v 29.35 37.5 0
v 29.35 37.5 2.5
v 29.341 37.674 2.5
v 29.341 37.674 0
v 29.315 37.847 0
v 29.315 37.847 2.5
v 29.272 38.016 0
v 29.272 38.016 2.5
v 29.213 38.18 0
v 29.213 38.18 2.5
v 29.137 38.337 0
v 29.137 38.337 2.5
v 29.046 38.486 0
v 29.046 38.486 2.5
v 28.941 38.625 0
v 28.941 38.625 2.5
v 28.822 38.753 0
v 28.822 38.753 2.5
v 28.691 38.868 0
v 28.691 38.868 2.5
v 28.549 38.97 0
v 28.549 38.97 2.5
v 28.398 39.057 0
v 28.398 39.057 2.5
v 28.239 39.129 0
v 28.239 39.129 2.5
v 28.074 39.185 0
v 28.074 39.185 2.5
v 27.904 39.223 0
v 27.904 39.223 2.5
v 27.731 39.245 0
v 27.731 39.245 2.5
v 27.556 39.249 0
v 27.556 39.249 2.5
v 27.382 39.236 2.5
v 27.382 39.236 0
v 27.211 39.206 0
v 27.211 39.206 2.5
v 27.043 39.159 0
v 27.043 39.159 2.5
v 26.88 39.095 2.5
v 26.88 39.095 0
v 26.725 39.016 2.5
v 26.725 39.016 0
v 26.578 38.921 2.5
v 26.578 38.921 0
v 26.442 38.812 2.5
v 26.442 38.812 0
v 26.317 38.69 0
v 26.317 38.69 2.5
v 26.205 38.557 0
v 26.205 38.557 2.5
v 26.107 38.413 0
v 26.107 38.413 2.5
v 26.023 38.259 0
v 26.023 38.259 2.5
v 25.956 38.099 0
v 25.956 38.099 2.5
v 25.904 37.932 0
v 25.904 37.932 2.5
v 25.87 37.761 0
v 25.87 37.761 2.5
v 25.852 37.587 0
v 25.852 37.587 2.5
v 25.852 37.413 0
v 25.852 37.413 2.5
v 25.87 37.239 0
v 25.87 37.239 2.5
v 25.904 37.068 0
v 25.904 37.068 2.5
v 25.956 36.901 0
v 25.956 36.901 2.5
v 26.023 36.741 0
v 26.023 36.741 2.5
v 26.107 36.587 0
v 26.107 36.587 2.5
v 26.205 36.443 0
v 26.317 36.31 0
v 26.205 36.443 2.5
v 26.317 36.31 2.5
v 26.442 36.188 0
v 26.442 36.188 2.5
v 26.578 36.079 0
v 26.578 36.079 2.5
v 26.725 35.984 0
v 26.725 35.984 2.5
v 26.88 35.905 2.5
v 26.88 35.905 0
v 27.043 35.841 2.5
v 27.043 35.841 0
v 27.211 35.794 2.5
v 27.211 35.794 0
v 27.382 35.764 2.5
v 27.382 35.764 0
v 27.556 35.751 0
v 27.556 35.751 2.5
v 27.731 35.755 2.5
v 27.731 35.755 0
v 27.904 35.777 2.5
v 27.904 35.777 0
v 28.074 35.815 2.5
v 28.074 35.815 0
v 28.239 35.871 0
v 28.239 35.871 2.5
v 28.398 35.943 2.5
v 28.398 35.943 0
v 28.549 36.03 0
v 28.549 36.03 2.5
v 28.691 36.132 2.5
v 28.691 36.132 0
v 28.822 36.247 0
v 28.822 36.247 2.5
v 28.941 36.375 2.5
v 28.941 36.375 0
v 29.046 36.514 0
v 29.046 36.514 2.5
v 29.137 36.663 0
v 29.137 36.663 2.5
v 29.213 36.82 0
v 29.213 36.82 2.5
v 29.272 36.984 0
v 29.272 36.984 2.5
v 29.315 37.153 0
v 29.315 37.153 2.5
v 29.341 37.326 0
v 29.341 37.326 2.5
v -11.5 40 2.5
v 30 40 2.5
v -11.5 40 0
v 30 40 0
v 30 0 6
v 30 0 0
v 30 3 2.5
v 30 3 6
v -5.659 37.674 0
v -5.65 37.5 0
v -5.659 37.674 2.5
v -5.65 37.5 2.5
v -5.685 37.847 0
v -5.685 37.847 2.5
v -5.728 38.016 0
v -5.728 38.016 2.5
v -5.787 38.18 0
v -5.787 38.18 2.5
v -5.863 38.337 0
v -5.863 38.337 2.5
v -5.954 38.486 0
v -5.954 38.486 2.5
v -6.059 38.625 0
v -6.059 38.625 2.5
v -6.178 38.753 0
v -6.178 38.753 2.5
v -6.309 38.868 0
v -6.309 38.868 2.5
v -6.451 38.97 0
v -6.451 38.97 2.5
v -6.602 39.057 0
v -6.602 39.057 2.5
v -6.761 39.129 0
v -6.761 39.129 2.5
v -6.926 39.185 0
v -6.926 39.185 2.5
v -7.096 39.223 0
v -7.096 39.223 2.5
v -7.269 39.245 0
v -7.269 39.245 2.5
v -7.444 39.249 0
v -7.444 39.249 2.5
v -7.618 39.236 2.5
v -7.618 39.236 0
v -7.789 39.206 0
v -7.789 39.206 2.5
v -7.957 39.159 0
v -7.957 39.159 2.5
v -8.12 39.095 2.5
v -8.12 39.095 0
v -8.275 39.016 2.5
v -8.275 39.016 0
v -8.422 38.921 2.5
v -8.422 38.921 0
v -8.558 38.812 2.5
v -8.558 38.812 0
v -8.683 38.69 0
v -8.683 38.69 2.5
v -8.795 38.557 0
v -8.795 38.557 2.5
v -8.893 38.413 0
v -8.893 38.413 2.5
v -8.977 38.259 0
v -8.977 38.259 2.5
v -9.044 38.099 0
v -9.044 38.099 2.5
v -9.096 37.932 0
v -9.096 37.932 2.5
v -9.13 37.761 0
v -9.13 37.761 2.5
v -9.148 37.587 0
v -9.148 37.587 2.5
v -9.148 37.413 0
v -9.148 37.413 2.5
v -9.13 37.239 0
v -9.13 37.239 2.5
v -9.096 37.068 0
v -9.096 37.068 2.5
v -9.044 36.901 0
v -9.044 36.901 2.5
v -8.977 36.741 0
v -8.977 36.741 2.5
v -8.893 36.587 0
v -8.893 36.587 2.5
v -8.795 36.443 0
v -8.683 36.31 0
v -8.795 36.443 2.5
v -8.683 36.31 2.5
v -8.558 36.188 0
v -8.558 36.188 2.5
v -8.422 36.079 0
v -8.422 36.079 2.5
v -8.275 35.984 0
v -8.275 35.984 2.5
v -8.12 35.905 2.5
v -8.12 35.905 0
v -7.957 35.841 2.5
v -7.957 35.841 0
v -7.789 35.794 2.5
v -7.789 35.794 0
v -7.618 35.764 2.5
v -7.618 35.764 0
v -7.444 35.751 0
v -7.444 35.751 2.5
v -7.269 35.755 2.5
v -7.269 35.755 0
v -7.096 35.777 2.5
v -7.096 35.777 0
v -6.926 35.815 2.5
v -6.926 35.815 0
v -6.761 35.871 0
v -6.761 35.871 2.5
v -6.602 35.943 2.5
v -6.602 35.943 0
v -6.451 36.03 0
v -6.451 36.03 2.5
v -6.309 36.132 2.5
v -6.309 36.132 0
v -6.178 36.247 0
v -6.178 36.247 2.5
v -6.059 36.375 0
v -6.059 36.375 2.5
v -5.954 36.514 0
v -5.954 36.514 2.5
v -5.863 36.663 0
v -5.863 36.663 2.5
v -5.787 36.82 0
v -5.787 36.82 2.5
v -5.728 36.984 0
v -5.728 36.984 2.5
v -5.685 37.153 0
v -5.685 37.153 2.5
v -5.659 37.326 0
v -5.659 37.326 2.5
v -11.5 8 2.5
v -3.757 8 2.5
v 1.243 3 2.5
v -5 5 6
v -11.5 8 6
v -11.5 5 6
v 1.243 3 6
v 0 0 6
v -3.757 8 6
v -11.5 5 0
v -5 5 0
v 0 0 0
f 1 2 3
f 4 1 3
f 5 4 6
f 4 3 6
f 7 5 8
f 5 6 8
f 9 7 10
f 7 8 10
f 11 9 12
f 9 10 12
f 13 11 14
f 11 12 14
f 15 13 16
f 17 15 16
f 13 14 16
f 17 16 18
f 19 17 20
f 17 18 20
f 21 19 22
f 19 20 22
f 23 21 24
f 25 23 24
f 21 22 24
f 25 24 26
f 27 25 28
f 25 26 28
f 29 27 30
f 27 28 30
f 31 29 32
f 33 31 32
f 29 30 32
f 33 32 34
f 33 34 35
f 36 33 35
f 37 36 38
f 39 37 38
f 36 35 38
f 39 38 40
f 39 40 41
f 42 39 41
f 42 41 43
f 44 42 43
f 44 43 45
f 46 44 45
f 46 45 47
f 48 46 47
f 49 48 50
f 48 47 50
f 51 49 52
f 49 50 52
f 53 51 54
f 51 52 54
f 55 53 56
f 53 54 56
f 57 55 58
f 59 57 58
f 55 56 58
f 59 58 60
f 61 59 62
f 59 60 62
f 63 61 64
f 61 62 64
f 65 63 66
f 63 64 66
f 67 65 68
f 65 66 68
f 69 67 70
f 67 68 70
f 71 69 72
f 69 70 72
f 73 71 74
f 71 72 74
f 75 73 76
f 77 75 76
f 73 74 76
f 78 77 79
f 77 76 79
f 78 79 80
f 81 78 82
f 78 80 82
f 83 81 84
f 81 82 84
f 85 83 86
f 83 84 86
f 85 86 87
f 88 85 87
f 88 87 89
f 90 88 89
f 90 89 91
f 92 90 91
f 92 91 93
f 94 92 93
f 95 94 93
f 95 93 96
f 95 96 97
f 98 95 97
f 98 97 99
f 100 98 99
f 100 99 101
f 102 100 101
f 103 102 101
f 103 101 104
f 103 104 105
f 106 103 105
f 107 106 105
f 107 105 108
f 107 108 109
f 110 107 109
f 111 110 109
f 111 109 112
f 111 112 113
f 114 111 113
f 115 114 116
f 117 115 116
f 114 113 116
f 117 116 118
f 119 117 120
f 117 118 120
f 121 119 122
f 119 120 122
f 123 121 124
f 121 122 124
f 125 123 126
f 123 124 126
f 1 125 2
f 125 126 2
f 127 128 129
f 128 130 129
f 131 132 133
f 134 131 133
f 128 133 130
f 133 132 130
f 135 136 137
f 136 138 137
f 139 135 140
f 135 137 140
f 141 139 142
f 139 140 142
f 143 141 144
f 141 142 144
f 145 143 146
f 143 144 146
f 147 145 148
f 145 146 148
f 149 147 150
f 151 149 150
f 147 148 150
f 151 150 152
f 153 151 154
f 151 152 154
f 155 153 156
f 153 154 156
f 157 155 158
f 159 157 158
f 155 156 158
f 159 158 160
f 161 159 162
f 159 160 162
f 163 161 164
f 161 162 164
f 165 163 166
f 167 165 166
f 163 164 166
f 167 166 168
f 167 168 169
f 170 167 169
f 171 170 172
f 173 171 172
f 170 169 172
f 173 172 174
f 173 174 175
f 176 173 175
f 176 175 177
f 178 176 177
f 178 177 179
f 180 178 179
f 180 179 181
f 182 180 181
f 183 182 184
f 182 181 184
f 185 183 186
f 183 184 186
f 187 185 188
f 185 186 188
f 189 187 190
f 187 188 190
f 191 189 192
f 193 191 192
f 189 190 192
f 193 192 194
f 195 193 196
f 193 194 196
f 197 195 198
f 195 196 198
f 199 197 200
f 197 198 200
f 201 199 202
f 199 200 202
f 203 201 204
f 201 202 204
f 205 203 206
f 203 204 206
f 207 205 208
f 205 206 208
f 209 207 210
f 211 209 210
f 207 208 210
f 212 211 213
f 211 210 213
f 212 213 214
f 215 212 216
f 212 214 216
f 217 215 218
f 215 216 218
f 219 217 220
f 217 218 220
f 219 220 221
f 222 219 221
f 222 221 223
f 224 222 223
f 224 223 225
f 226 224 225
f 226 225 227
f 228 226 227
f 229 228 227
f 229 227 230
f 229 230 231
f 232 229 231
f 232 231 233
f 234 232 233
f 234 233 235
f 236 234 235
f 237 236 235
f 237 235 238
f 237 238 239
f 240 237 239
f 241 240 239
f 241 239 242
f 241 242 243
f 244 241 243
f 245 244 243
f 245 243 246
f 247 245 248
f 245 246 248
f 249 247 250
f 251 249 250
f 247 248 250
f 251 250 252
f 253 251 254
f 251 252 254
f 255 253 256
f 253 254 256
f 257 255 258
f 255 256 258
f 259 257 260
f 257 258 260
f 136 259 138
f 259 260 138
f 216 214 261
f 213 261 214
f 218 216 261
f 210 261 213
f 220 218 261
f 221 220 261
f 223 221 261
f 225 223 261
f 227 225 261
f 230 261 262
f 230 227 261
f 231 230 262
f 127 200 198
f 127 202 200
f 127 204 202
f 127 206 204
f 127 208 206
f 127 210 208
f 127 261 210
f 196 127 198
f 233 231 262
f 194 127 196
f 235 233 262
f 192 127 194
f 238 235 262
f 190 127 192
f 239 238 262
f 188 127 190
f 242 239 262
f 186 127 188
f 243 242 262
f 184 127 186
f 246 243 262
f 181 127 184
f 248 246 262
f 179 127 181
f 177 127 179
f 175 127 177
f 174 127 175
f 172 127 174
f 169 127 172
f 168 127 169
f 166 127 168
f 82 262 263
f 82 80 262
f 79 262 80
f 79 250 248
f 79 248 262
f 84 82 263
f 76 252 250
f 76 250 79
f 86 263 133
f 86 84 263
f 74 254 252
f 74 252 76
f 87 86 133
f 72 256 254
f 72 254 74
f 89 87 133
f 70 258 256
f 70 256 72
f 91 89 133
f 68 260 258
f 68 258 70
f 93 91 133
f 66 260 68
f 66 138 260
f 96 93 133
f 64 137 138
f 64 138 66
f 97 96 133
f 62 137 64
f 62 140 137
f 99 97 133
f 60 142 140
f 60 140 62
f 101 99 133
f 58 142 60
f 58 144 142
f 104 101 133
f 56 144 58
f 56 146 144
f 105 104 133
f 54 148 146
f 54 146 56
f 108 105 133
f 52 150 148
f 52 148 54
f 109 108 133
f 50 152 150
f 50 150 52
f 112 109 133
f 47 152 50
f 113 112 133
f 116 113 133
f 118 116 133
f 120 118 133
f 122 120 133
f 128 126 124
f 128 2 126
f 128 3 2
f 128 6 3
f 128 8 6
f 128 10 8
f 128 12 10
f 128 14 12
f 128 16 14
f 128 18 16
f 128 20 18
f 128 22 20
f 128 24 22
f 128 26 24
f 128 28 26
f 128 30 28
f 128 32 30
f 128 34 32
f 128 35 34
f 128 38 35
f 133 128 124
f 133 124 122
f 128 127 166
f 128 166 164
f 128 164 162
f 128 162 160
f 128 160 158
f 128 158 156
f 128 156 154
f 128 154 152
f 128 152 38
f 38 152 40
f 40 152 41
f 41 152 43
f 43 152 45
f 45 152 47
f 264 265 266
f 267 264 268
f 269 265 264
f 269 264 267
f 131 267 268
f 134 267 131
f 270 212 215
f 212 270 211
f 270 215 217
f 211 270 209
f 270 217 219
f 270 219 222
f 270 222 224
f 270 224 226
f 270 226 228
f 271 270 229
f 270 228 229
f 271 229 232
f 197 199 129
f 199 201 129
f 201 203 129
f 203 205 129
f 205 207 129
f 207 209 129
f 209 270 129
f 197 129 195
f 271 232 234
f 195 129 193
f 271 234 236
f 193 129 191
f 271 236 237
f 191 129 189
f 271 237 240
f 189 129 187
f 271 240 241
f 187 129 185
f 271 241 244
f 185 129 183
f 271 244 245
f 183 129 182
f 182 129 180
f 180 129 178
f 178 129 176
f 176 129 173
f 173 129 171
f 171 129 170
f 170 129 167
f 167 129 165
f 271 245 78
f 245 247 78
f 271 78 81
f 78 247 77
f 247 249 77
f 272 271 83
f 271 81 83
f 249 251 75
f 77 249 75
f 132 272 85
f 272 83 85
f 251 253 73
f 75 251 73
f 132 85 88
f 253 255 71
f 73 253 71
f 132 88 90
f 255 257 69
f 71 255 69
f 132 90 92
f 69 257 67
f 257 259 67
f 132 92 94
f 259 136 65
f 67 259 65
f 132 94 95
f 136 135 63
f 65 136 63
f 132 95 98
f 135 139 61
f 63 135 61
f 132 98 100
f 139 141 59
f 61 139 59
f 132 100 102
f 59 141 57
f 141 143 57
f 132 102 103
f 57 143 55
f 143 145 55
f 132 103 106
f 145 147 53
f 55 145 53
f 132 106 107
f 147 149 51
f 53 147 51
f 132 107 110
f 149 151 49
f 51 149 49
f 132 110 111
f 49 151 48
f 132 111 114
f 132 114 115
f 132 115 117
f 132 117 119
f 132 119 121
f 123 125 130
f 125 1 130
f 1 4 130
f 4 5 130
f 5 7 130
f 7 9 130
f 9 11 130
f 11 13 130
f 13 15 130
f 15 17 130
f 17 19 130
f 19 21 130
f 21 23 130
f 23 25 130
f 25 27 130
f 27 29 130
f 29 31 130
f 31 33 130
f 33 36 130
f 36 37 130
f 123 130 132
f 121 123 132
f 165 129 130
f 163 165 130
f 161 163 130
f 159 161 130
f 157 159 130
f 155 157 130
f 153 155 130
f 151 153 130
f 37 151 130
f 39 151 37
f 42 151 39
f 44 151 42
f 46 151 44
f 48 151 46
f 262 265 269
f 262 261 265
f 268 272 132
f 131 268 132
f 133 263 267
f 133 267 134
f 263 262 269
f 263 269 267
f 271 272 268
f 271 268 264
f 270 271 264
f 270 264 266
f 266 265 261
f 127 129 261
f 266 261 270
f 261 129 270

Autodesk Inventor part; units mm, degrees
ref_plane "YZ Plane" through (0, 0, 0) normal (1, 0, 0) x (0, 1, 0)
ref_plane "XZ Plane" through (0, 0, 0) normal (0, 1, 0) x (-1, 0, 0)
ref_plane "XY Plane" through (0, 0, 0) normal (0, 0, 1) x (1, 0, 0)
sketch "Sketch4" plane through (0, 0, 0) normal (0, 0, 1) x (1, 0, 0)
  line L0 (0, 0) -> (30, 0)
  line L1 (0, 0) -> (-5, 5)
  line L2 (-5, 5) -> (-11.5, 5)
  line L3 (30, 0) -> (30, 40)
  line L4 (30, 40) -> (-11.5, 40)
  line L5 (-11.5, 40) -> (-11.5, 5)
  dimension "d16" = 30
  dimension "d17" = 5
  dimension "d18" = 135
  dimension "d19" = 6.5
  dimension "d20" = 40
extrude "Extrusion4" add sketch "Sketch4" along normal blind 2.5
sketch "Sketch5" plane through (0, 0, 2.5) normal (0, 0, 1) x (1, 0, 0)
  line L0 (0, 0) -> (30, 0) projected
  line L1 (30, 0) -> (30, 40) projected
  line L2 (-11.5, 40) -> (-11.5, 5) projected
  line L3 (-11.5, 5) -> (-5, 5) projected
  line L4 (-5, 5) -> (0, 0) projected
  line L5 (-11.5, 8) -> (-3.7574, 8)
  line L6 (-3.7574, 8) -> (1.2426, 3)
  line L7 (1.2426, 3) -> (30, 3)
  dimension "d23" = 3
  dimension "d24" = 3
  dimension "d25" = 3
extrude "Extrusion5" add sketch "Sketch5" along normal blind 3.5
sketch "Sketch6" plane through (0, 0, 2.5) normal (0, 0, 1) x (1, 0, 0)
  line L0 (-11.5, 8) -> (-3.7574, 8) projected
  line L1 (1.2426, 3) -> (30, 3) projected
  line L2 (30, 3) -> (30, 40) projected
  line L3 (-11.5, 40) -> (-11.5, 8) projected
  circle A0 centre (-7.4, 37.5) radius 1.75
  circle A1 centre (27.6, 37.5) radius 1.75
  point P0 (0, 0)
  dimension "d28" = 29.5
  dimension "d29" = 4.1
  dimension "d30" = 3.5
  dimension "d31" = 3.5
  dimension "d32" = 2.4
  dimension "d33" = 34.5
  dimension "d36" = 6
  dimension "d37" = 6
extrude "Extrusion6" cut sketch "Sketch6" against normal up to next
properties part number "XCarriageFanMount"
